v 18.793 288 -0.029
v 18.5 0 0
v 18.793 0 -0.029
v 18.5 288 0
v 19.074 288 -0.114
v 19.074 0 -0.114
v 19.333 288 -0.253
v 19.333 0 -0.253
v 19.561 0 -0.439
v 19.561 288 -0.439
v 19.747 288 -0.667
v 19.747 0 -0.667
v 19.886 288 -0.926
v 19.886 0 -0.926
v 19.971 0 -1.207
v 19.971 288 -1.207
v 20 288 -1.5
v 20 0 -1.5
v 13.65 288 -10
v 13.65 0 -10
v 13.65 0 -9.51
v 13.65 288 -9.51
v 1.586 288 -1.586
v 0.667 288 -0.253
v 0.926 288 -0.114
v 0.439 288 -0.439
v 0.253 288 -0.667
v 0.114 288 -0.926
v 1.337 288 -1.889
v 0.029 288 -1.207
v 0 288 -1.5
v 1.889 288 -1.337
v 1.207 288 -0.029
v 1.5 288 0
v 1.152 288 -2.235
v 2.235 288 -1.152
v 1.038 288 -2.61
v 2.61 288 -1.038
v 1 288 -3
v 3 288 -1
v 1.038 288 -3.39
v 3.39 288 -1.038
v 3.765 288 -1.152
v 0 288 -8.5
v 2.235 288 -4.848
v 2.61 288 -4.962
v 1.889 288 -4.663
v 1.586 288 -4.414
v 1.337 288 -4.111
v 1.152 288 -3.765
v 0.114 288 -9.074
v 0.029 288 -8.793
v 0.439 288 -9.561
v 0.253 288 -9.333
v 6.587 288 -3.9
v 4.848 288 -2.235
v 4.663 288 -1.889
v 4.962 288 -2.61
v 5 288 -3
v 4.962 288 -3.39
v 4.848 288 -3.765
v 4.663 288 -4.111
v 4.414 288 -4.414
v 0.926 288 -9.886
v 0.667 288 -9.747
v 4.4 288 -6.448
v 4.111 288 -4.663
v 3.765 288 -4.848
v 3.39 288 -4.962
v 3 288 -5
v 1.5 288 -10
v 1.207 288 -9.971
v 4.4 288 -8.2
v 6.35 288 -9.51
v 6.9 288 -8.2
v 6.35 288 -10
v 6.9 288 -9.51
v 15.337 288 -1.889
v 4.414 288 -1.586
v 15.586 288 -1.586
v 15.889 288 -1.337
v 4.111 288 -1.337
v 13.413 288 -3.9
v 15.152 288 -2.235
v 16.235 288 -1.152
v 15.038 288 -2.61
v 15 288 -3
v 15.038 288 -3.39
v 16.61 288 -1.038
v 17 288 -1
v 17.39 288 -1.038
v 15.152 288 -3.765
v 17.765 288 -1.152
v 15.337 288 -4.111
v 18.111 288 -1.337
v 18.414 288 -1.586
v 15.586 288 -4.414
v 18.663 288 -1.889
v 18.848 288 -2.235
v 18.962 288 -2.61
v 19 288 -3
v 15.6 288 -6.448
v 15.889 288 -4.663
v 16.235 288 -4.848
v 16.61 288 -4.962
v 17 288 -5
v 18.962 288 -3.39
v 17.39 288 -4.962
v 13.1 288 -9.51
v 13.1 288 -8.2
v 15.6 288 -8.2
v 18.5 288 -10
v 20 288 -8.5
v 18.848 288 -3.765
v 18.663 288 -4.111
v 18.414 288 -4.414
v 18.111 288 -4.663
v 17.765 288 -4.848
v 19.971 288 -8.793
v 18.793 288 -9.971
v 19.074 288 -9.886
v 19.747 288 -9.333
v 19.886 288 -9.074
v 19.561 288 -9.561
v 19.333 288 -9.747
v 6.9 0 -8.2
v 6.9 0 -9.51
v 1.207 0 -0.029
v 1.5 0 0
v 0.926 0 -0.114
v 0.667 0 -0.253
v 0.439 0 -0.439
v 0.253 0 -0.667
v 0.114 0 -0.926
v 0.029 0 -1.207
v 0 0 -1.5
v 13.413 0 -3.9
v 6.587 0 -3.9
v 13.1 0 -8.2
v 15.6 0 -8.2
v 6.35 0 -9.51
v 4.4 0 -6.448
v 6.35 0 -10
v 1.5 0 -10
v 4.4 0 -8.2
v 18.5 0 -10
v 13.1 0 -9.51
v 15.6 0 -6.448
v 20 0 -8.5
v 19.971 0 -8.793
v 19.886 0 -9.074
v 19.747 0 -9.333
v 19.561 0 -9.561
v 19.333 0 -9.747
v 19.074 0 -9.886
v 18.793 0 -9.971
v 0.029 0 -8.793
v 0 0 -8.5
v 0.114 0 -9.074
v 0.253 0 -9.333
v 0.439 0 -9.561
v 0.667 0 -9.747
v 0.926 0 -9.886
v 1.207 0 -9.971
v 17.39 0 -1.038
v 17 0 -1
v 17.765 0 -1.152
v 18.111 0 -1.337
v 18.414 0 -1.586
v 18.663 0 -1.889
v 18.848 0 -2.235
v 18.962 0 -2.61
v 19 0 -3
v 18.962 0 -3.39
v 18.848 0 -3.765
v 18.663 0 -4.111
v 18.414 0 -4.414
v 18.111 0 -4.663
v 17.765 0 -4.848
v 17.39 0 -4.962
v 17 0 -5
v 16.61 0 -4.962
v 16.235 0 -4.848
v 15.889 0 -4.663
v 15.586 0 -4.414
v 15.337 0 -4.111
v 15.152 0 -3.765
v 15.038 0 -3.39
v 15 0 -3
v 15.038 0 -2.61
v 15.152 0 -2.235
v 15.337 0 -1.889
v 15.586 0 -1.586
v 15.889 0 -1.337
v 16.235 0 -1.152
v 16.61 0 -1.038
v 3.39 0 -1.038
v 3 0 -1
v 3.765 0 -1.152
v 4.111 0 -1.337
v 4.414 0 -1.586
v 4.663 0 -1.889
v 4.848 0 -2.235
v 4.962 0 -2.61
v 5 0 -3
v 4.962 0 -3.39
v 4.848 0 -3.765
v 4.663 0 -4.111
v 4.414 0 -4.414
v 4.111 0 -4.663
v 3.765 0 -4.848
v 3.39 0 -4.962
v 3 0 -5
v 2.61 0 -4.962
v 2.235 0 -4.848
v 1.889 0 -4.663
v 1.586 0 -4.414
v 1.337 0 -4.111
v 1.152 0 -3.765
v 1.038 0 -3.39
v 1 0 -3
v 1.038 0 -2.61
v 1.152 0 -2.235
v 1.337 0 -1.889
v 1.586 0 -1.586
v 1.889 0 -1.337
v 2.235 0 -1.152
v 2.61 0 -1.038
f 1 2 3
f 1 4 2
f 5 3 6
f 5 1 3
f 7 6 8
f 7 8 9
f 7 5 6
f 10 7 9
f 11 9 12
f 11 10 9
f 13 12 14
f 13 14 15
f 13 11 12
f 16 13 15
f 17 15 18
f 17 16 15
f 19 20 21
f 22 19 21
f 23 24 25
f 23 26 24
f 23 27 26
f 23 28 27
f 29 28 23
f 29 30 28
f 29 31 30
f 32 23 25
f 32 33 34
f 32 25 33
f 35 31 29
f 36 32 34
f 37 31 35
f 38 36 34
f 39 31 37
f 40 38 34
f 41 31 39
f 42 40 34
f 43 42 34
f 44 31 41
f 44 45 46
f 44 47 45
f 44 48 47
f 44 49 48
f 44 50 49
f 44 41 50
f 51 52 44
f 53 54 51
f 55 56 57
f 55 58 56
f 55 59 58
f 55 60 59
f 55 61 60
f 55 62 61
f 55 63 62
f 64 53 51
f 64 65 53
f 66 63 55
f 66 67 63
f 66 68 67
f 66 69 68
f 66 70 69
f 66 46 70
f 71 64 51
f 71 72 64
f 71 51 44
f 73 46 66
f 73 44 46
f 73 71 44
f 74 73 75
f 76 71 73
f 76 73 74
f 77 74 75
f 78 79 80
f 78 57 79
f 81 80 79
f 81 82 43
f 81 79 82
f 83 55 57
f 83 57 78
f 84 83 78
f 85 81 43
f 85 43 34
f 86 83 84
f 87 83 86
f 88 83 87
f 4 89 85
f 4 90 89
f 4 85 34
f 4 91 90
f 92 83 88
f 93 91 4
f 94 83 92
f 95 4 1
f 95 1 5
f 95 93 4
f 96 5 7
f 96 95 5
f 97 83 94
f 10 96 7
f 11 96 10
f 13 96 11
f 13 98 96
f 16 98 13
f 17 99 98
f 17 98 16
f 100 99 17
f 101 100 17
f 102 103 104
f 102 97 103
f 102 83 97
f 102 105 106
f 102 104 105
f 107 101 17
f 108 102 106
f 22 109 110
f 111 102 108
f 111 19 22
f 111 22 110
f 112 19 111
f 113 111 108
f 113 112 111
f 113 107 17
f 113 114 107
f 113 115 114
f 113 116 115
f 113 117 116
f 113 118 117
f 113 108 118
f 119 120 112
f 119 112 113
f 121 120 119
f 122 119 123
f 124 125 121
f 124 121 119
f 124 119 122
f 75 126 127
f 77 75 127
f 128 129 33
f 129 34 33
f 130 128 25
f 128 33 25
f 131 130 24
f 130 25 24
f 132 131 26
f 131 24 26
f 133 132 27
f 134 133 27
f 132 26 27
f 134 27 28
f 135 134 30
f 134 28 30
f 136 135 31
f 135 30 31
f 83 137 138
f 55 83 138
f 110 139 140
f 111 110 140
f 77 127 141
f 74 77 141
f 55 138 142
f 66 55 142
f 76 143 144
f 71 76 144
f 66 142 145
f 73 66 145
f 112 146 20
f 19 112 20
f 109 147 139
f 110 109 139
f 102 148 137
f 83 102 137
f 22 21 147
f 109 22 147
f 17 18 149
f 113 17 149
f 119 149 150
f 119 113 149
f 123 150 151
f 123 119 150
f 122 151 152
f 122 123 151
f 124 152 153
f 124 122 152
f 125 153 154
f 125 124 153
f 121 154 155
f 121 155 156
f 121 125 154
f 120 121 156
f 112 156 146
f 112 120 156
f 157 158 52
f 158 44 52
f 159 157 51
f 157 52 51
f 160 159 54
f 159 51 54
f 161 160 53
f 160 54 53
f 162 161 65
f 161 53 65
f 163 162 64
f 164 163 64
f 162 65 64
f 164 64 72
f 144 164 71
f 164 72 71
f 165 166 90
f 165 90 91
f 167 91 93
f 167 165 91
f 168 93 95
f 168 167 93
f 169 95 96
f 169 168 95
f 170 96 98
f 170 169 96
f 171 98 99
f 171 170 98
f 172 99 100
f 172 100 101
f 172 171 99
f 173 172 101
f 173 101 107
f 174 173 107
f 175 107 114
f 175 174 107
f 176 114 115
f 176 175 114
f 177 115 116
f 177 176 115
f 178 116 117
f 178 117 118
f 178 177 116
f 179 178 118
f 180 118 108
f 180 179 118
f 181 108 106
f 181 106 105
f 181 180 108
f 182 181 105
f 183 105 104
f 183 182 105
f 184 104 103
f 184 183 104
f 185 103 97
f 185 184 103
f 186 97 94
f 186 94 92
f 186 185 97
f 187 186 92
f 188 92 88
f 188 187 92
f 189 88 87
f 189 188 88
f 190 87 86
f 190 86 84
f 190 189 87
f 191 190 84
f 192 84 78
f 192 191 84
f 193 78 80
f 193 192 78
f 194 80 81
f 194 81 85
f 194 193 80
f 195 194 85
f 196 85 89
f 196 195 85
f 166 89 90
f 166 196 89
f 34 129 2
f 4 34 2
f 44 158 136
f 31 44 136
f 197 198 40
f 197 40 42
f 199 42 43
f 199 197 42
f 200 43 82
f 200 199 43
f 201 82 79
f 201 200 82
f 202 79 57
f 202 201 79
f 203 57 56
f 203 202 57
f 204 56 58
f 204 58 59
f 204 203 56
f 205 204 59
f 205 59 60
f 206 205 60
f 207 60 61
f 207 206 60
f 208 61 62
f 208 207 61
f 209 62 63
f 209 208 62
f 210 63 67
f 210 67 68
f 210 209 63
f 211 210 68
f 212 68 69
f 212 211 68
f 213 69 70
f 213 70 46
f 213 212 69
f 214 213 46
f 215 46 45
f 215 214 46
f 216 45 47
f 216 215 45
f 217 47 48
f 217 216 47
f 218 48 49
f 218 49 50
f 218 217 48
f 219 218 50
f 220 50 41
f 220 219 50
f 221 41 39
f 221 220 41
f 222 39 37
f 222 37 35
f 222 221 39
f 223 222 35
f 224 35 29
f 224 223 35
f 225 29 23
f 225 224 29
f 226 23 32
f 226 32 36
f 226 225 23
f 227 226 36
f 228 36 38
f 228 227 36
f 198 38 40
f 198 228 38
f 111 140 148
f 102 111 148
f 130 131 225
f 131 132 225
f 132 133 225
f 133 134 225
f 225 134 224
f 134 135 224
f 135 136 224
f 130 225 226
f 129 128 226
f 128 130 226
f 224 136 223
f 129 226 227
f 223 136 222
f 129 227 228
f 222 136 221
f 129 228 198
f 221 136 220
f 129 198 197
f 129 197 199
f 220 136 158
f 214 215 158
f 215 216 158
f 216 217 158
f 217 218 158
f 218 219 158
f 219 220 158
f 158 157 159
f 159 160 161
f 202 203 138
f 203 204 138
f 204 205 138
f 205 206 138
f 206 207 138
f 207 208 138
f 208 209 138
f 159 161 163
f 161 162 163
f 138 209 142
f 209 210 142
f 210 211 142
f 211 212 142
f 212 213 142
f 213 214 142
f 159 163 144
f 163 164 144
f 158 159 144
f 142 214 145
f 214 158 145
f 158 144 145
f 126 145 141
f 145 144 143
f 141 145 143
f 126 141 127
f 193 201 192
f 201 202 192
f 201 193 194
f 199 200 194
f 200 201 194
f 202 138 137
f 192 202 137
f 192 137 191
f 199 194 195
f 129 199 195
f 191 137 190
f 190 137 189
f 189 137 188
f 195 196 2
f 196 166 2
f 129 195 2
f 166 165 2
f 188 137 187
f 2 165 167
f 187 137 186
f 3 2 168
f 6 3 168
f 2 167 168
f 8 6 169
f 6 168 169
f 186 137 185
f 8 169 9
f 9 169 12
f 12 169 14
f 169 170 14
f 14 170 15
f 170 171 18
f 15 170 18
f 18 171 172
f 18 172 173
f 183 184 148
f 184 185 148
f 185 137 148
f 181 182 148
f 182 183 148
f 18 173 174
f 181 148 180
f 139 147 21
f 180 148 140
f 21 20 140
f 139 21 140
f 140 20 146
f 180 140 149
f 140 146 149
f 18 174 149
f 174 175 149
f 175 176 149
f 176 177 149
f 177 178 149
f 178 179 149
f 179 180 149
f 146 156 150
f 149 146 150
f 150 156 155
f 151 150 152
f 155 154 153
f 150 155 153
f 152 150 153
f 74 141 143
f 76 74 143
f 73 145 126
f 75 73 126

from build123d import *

# Parameters (mm, degrees)
SKETCH_1_R      = 2
EXTRUDE_1_DEPTH = 288
FILLET_1_R      = 1.5


with BuildPart() as part:
    # 草图1 → 凸台-拉伸1 (new body)
    with BuildSketch(Plane(origin=(0, 0, 0), x_dir=(1, 0, 0), z_dir=(0, 1, 0))):
        Polygon((0, 0), (20, 0), (20, 10), (13.65, 10), (13.65, 9.510427602), (13.1, 9.510427602), (13.1, 8.2), (15.6, 8.2), (15.6, 6.447507136), (13.412706863, 3.9), (6.587293137, 3.9), (4.4, 6.447507136), (4.4, 8.2), (6.9, 8.2), (6.9, 9.510427602), (6.35, 9.510427602), (6.35, 10), (0, 10), align=None)
        with Locations(Location((3, 3, 0), (0, 0, 270))):
            Circle(SKETCH_1_R, mode=Mode.SUBTRACT)
        with Locations(Location((17, 3, 0), (0, 0, 270))):
            Circle(SKETCH_1_R, mode=Mode.SUBTRACT)
    extrude(amount=EXTRUDE_1_DEPTH)

    # 圆角1
    fillet_1_edges = [part.edges().sort_by_distance(p)[0] for p in [
        (0, 144, -10),
        (20, 144, -10),
        (20, 144, 0),
        (0, 144, 0),
    ]]
    fillet(fillet_1_edges, radius=FILLET_1_R)


solid = part.part
